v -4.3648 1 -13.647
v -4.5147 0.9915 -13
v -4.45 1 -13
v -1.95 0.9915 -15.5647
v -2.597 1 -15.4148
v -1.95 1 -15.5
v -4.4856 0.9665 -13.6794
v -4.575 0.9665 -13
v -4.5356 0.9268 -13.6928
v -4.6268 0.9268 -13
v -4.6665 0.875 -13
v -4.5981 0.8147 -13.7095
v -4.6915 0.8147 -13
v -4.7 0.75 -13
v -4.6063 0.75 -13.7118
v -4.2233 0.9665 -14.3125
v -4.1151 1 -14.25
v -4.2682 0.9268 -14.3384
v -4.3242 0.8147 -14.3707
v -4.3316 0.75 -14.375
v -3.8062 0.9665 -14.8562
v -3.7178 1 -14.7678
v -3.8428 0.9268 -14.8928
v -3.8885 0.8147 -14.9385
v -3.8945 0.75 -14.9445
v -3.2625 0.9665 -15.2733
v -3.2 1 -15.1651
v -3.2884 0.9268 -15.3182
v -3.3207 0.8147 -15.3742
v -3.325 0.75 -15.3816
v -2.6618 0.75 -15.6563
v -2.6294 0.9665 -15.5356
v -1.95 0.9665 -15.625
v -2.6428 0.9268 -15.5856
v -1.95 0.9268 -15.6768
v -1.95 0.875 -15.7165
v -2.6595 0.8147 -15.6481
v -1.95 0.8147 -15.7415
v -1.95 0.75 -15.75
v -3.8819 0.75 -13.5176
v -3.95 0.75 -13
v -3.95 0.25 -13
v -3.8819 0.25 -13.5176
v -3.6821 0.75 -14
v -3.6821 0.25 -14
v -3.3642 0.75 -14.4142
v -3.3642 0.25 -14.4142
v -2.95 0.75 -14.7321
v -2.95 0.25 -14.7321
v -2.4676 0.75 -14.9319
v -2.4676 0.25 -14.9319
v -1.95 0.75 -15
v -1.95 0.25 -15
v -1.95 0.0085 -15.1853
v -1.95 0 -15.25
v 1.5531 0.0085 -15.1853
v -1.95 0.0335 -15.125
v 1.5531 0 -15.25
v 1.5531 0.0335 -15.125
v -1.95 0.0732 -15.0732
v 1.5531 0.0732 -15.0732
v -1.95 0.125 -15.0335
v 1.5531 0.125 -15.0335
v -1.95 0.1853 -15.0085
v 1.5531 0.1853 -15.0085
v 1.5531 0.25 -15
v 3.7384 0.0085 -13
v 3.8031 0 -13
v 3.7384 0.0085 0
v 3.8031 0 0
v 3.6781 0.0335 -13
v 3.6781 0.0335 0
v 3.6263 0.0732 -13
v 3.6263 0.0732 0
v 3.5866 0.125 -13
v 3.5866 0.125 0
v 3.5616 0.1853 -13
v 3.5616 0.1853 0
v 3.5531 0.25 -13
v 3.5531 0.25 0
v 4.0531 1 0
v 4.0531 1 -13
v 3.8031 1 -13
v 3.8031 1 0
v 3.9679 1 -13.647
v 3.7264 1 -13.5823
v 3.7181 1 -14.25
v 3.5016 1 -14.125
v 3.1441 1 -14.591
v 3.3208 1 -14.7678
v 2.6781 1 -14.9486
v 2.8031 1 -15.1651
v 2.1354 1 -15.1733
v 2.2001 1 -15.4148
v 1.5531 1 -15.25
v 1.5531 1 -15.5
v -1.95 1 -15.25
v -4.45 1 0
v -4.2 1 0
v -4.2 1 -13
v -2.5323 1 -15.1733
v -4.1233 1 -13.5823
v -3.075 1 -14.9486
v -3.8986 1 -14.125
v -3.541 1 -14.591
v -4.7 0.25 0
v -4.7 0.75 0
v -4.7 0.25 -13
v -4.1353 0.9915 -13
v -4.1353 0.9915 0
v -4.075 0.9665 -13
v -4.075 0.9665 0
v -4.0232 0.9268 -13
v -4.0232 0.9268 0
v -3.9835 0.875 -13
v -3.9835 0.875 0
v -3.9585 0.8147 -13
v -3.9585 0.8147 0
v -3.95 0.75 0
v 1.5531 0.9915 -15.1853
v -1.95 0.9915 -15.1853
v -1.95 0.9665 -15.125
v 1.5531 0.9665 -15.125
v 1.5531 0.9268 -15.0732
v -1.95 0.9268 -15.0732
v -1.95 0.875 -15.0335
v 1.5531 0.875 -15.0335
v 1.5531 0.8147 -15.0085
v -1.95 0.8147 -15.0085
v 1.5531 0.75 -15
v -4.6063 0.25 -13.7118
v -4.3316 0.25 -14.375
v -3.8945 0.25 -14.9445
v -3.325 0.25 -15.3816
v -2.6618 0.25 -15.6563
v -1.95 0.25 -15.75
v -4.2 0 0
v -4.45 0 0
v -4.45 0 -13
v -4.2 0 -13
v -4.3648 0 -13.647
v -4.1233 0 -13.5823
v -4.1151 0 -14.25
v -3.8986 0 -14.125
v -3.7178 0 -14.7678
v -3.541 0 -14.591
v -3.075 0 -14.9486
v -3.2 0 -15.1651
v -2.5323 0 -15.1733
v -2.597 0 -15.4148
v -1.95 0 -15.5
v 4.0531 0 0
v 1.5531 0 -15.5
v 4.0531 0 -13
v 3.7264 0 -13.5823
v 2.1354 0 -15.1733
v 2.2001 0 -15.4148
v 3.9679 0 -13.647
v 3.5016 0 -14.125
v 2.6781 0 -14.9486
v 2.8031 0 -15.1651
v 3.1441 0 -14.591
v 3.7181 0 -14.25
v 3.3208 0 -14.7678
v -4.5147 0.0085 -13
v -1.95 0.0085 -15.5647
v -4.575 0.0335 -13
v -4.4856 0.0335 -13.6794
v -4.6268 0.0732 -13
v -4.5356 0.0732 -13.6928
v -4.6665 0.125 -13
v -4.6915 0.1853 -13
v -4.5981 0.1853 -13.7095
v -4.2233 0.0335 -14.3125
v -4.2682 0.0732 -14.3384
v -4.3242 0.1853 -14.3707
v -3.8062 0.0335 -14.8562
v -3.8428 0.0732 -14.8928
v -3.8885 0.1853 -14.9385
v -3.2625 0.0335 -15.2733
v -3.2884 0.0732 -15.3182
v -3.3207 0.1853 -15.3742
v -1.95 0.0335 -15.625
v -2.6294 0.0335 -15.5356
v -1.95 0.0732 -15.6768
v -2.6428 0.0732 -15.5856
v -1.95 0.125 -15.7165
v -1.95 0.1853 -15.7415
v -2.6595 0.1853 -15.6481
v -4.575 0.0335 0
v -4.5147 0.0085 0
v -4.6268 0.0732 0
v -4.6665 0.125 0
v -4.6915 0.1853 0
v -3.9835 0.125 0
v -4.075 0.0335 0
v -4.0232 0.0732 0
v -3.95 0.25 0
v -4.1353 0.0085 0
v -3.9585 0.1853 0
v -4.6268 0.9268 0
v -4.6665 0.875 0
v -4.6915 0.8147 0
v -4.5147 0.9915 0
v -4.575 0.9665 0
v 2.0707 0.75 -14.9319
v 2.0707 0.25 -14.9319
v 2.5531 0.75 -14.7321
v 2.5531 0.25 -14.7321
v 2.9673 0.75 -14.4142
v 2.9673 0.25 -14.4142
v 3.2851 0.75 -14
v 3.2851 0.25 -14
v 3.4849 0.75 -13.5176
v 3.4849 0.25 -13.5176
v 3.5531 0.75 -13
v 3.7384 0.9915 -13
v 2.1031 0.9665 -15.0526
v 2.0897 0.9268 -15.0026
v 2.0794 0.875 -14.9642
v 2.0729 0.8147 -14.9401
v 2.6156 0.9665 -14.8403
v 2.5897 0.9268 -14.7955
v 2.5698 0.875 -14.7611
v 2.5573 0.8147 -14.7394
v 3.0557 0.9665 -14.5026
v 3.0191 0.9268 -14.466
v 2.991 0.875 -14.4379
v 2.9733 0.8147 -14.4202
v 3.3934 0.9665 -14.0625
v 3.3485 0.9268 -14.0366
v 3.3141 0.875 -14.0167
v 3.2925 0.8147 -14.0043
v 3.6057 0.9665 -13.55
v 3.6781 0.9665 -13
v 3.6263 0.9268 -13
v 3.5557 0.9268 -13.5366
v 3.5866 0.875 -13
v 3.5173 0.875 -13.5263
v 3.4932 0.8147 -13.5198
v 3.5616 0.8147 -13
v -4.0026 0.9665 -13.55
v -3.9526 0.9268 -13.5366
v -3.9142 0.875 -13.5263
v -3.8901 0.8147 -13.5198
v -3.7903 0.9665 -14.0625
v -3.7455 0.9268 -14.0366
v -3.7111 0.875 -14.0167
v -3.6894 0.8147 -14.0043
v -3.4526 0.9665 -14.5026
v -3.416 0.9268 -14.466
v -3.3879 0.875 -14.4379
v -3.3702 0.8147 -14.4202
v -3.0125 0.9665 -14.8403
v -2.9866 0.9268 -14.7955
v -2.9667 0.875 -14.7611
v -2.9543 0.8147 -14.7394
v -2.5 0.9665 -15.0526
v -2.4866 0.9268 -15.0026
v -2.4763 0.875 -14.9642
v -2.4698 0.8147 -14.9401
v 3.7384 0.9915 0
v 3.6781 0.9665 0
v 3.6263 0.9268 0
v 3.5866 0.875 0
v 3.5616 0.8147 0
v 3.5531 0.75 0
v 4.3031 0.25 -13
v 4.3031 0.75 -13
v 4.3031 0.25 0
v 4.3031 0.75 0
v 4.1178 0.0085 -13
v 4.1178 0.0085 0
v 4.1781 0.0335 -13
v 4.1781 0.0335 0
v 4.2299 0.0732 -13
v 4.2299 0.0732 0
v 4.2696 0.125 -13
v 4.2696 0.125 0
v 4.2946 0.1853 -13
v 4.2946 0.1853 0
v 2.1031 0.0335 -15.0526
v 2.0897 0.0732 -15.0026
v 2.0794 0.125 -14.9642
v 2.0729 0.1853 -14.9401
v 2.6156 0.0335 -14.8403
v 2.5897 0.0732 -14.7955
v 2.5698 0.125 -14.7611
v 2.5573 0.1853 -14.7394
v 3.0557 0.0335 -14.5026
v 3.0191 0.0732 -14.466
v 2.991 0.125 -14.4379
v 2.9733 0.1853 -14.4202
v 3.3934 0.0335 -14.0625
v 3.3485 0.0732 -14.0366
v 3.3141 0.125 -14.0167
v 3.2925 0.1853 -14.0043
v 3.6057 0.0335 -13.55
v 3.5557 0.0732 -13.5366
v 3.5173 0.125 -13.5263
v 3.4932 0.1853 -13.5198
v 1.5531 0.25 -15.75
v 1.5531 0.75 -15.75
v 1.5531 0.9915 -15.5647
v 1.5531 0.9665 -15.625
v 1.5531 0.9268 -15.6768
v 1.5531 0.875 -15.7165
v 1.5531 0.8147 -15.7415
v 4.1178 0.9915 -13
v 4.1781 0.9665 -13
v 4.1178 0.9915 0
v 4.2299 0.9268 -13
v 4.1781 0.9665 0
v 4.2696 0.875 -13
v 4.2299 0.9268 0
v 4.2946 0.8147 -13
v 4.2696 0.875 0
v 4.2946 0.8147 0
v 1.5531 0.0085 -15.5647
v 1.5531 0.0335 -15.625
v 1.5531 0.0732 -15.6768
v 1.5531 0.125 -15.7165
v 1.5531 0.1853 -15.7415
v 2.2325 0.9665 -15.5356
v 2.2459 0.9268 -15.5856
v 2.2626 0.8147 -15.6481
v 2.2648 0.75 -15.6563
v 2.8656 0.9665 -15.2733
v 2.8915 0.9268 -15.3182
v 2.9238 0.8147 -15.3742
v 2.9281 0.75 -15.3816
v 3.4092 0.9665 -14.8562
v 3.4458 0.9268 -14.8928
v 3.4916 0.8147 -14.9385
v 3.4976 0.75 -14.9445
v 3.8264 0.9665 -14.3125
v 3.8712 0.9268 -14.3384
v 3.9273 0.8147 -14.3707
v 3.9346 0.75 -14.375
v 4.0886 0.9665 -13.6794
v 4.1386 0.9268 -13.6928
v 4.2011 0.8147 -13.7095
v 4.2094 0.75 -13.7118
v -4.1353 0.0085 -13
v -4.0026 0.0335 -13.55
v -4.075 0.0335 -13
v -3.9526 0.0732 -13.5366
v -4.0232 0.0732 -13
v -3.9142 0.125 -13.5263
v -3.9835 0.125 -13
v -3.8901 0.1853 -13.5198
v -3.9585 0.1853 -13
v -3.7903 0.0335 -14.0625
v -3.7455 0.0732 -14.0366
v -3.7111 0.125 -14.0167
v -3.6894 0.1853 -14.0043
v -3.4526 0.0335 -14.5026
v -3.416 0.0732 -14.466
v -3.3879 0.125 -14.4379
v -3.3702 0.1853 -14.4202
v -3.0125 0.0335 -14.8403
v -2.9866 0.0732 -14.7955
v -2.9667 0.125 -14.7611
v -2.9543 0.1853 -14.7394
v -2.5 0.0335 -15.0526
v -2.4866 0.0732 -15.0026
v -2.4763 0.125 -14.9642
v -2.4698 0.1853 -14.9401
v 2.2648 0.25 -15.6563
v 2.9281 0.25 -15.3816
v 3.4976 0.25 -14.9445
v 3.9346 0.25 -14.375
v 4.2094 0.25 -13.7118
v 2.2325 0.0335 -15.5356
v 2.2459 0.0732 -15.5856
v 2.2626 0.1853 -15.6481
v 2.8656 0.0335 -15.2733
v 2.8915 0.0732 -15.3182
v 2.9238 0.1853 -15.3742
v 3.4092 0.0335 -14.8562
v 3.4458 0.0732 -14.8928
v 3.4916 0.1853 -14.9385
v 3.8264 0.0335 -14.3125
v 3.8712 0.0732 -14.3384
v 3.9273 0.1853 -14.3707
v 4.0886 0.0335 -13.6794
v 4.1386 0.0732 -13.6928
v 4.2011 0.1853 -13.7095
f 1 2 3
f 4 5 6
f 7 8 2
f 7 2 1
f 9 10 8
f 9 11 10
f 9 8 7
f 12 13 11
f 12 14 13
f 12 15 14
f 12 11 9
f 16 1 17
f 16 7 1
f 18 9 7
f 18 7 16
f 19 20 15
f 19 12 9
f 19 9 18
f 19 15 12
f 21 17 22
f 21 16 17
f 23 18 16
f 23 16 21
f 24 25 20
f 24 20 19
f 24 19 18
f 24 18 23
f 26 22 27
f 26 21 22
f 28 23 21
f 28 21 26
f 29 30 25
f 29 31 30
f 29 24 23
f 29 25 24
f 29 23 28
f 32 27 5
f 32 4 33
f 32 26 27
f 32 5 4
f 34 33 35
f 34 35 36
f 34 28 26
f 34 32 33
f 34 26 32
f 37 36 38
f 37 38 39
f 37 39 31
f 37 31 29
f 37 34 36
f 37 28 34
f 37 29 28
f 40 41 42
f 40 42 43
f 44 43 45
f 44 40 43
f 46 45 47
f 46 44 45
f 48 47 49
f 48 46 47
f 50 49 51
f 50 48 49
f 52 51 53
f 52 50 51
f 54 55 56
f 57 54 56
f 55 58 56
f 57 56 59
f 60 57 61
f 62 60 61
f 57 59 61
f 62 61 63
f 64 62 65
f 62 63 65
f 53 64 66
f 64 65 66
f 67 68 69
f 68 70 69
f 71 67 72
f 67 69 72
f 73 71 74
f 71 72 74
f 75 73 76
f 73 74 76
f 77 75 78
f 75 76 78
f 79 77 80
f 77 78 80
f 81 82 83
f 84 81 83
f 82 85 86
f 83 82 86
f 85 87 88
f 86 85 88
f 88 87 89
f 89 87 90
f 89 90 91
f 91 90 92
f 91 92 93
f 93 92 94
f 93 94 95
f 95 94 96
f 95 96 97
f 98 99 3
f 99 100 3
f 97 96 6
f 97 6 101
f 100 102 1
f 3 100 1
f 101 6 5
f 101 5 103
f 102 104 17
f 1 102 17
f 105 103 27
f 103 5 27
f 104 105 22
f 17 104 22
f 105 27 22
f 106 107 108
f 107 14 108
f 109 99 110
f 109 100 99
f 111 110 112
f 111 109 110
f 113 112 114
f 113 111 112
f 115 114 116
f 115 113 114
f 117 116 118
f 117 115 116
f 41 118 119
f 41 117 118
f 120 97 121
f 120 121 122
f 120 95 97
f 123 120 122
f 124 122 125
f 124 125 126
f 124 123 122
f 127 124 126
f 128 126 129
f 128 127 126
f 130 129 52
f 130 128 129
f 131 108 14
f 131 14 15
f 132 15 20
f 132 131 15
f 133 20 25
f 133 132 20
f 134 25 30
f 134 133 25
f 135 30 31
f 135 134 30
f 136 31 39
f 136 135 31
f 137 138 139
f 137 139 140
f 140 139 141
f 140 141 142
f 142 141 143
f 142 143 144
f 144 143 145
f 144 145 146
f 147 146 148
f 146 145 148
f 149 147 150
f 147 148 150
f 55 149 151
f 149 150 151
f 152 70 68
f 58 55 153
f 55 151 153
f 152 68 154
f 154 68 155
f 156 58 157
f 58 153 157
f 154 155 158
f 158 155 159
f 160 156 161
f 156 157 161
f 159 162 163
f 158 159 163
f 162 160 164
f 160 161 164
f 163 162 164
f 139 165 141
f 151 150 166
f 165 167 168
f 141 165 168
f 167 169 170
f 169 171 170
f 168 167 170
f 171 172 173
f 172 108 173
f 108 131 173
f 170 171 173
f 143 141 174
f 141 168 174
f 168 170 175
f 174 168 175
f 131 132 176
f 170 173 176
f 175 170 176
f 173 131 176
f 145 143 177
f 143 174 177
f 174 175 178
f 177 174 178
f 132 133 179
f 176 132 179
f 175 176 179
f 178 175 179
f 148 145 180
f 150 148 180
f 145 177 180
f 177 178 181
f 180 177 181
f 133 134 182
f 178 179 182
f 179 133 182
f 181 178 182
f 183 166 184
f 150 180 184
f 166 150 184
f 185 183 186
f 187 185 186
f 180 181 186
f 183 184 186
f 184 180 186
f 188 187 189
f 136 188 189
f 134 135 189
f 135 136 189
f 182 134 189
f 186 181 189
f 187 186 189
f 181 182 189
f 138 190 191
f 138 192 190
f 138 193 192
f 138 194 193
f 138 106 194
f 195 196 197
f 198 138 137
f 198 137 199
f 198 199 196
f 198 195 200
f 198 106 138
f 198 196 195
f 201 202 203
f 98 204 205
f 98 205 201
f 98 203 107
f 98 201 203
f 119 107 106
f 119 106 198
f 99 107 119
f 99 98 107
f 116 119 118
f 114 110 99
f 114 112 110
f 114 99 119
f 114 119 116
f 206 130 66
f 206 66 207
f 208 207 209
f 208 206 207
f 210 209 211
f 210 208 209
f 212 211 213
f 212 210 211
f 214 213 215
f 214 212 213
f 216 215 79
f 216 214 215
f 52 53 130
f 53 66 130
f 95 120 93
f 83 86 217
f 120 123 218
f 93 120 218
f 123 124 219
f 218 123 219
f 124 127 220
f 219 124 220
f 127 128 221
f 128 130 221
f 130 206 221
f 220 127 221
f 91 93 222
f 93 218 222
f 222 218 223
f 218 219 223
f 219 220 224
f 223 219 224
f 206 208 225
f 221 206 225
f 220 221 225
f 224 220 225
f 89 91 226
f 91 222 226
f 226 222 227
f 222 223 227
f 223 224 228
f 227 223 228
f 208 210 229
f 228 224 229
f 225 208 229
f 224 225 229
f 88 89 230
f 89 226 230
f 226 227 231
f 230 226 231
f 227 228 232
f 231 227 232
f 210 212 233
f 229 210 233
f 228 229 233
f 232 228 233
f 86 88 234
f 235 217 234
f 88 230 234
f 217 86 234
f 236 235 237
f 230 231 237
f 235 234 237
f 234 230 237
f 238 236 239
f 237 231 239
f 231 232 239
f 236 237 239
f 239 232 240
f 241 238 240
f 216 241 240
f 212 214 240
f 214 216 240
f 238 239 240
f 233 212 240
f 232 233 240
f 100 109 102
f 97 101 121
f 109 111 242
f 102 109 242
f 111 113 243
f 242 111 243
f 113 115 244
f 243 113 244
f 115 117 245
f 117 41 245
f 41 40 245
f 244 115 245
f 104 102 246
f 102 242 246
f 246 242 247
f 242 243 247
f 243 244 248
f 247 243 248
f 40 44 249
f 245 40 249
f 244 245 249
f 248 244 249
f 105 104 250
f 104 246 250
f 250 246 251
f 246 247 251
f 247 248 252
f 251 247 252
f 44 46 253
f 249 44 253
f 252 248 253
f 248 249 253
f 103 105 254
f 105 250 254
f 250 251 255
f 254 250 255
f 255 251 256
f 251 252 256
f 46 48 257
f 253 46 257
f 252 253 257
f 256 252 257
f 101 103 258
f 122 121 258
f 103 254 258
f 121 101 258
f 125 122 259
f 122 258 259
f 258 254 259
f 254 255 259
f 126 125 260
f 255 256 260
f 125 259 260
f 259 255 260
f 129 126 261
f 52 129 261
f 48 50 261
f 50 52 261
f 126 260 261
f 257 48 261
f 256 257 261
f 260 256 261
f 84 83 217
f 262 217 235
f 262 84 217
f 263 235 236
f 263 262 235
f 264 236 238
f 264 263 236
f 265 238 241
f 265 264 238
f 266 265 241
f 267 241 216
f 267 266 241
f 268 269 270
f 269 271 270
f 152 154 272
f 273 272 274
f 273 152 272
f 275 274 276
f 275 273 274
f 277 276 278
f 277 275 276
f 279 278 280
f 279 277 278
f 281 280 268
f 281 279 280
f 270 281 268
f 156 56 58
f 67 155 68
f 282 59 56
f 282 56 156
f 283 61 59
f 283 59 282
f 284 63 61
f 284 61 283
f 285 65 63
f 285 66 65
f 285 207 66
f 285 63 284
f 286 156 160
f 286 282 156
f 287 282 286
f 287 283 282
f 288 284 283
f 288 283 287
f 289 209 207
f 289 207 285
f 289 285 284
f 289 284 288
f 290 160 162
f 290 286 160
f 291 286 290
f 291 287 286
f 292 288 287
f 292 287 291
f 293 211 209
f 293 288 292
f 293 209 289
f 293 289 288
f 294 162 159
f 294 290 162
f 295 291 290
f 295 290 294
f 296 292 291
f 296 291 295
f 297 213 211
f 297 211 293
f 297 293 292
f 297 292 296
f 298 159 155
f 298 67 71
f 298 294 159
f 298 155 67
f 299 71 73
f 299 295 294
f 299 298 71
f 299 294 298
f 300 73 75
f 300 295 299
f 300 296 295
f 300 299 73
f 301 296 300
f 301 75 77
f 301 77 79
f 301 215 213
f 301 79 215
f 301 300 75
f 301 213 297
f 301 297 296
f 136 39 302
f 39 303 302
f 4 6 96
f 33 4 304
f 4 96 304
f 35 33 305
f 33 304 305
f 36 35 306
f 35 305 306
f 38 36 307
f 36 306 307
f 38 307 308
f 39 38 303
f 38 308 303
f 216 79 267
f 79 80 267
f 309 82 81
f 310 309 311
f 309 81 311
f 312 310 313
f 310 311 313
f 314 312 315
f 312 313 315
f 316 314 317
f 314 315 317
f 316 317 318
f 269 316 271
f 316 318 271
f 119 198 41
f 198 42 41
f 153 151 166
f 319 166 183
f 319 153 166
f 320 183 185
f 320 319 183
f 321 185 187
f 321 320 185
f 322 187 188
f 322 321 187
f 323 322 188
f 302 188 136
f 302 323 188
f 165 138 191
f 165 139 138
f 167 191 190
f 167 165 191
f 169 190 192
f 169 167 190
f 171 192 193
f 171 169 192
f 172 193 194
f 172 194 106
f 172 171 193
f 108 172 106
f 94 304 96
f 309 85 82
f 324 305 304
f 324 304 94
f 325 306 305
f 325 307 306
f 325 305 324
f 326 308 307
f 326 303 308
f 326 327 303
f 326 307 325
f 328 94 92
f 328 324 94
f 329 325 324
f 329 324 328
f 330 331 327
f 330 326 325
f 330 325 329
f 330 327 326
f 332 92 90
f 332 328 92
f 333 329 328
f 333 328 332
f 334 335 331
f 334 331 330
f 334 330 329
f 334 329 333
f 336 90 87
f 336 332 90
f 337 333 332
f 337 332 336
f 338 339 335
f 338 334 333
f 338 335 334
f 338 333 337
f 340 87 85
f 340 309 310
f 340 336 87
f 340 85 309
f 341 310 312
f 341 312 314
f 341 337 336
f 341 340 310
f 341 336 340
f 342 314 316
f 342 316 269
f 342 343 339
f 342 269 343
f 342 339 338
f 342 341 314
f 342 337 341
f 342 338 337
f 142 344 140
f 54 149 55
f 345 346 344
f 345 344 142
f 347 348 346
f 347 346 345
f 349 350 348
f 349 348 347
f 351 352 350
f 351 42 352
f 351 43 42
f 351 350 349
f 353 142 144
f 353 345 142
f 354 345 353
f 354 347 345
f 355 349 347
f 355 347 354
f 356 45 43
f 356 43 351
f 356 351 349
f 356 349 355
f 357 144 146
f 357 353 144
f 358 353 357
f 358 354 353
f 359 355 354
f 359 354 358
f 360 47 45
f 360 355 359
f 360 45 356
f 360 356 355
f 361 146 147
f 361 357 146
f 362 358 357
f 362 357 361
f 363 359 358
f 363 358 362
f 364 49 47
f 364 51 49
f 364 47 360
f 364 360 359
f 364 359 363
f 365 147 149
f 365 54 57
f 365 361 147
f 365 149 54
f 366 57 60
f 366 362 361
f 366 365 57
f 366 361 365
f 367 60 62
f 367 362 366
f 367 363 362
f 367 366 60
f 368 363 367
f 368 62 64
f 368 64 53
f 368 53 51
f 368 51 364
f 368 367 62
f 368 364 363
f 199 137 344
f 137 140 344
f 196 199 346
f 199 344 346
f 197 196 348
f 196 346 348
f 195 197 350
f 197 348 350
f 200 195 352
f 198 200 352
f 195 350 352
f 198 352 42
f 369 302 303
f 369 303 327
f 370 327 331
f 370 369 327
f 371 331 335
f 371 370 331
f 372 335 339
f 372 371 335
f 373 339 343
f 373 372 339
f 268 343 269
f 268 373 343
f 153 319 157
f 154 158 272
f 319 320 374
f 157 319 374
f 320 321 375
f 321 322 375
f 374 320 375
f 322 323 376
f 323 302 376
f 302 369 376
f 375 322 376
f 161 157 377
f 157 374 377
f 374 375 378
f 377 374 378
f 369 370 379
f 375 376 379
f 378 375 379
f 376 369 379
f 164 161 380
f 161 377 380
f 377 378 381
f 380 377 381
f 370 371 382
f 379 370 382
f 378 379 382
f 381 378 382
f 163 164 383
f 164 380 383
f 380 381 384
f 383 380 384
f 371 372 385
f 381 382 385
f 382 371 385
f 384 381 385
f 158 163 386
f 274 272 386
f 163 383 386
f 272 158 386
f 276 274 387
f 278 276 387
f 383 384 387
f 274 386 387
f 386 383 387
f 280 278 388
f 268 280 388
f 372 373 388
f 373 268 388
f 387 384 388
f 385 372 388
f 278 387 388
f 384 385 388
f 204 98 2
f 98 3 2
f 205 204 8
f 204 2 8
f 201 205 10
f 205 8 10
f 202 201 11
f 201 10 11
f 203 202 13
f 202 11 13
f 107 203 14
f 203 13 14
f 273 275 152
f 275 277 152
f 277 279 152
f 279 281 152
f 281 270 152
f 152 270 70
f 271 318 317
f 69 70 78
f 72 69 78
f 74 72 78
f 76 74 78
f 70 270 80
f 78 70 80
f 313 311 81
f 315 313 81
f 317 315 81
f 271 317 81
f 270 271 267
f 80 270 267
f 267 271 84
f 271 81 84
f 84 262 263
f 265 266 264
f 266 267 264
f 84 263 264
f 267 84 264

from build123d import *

# Parameters (mm, degrees)
SKETCH2_W = 0.75
SKETCH2_H = 1
FILLET1_R = 0.25


with BuildPart() as part:
    # Sweep1: sweep along a path in Sketch1
    with BuildLine(Plane(origin=(0, 0, 0), x_dir=(1, 0, 0), z_dir=(0, 1, 0))) as sweep1_path:
        Line((-3.95, 0), (-3.95, 13))
        ThreePointArc((-3.95, 13), (-3.364213562, 14.414213562), (-1.95, 15))
        Line((-1.95, 15), (1.553078387, 15))
        ThreePointArc((1.553078387, 15), (2.96729195, 14.414213562), (3.553078387, 13))
        Line((3.553078387, 13), (3.553078387, 0))
    # Sketch2 → Sweep1 (sweep)
    with BuildSketch(Plane.XY):
        with Locations((-4.325, 0.5)):
            Rectangle(SKETCH2_W, SKETCH2_H)
    sweep(path=sweep1_path.line)

    # Fillet1
    fillet1_edges = [part.edges().sort_by_distance(p)[0] for p in [
        (-3.364213562, 1, -14.414213562),
        (-3.894543648, 1, -14.944543648),
        (-3.894543648, 0, -14.944543648),
        (-3.364213562, 0, -14.414213562),
        (-0.198460806, 1, -15),
        (-0.198460806, 1, -15.75),
        (-0.198460806, 0, -15.75),
        (-0.198460806, 0, -15),
        (2.96729195, 1, -14.414213562),
        (3.497622036, 1, -14.944543648),
        (3.497622036, 0, -14.944543648),
        (2.96729195, 0, -14.414213562),
        (3.553078387, 1, -6.5),
        (4.303078387, 1, -6.5),
        (4.303078387, 0, -6.5),
        (3.553078387, 0, -6.5),
        (-3.95, 0, -6.5),
        (-4.7, 0, -6.5),
        (-4.7, 1, -6.5),
        (-3.95, 1, -6.5),
    ]]
    fillet(fillet1_edges, radius=FILLET1_R)


solid = part.part
